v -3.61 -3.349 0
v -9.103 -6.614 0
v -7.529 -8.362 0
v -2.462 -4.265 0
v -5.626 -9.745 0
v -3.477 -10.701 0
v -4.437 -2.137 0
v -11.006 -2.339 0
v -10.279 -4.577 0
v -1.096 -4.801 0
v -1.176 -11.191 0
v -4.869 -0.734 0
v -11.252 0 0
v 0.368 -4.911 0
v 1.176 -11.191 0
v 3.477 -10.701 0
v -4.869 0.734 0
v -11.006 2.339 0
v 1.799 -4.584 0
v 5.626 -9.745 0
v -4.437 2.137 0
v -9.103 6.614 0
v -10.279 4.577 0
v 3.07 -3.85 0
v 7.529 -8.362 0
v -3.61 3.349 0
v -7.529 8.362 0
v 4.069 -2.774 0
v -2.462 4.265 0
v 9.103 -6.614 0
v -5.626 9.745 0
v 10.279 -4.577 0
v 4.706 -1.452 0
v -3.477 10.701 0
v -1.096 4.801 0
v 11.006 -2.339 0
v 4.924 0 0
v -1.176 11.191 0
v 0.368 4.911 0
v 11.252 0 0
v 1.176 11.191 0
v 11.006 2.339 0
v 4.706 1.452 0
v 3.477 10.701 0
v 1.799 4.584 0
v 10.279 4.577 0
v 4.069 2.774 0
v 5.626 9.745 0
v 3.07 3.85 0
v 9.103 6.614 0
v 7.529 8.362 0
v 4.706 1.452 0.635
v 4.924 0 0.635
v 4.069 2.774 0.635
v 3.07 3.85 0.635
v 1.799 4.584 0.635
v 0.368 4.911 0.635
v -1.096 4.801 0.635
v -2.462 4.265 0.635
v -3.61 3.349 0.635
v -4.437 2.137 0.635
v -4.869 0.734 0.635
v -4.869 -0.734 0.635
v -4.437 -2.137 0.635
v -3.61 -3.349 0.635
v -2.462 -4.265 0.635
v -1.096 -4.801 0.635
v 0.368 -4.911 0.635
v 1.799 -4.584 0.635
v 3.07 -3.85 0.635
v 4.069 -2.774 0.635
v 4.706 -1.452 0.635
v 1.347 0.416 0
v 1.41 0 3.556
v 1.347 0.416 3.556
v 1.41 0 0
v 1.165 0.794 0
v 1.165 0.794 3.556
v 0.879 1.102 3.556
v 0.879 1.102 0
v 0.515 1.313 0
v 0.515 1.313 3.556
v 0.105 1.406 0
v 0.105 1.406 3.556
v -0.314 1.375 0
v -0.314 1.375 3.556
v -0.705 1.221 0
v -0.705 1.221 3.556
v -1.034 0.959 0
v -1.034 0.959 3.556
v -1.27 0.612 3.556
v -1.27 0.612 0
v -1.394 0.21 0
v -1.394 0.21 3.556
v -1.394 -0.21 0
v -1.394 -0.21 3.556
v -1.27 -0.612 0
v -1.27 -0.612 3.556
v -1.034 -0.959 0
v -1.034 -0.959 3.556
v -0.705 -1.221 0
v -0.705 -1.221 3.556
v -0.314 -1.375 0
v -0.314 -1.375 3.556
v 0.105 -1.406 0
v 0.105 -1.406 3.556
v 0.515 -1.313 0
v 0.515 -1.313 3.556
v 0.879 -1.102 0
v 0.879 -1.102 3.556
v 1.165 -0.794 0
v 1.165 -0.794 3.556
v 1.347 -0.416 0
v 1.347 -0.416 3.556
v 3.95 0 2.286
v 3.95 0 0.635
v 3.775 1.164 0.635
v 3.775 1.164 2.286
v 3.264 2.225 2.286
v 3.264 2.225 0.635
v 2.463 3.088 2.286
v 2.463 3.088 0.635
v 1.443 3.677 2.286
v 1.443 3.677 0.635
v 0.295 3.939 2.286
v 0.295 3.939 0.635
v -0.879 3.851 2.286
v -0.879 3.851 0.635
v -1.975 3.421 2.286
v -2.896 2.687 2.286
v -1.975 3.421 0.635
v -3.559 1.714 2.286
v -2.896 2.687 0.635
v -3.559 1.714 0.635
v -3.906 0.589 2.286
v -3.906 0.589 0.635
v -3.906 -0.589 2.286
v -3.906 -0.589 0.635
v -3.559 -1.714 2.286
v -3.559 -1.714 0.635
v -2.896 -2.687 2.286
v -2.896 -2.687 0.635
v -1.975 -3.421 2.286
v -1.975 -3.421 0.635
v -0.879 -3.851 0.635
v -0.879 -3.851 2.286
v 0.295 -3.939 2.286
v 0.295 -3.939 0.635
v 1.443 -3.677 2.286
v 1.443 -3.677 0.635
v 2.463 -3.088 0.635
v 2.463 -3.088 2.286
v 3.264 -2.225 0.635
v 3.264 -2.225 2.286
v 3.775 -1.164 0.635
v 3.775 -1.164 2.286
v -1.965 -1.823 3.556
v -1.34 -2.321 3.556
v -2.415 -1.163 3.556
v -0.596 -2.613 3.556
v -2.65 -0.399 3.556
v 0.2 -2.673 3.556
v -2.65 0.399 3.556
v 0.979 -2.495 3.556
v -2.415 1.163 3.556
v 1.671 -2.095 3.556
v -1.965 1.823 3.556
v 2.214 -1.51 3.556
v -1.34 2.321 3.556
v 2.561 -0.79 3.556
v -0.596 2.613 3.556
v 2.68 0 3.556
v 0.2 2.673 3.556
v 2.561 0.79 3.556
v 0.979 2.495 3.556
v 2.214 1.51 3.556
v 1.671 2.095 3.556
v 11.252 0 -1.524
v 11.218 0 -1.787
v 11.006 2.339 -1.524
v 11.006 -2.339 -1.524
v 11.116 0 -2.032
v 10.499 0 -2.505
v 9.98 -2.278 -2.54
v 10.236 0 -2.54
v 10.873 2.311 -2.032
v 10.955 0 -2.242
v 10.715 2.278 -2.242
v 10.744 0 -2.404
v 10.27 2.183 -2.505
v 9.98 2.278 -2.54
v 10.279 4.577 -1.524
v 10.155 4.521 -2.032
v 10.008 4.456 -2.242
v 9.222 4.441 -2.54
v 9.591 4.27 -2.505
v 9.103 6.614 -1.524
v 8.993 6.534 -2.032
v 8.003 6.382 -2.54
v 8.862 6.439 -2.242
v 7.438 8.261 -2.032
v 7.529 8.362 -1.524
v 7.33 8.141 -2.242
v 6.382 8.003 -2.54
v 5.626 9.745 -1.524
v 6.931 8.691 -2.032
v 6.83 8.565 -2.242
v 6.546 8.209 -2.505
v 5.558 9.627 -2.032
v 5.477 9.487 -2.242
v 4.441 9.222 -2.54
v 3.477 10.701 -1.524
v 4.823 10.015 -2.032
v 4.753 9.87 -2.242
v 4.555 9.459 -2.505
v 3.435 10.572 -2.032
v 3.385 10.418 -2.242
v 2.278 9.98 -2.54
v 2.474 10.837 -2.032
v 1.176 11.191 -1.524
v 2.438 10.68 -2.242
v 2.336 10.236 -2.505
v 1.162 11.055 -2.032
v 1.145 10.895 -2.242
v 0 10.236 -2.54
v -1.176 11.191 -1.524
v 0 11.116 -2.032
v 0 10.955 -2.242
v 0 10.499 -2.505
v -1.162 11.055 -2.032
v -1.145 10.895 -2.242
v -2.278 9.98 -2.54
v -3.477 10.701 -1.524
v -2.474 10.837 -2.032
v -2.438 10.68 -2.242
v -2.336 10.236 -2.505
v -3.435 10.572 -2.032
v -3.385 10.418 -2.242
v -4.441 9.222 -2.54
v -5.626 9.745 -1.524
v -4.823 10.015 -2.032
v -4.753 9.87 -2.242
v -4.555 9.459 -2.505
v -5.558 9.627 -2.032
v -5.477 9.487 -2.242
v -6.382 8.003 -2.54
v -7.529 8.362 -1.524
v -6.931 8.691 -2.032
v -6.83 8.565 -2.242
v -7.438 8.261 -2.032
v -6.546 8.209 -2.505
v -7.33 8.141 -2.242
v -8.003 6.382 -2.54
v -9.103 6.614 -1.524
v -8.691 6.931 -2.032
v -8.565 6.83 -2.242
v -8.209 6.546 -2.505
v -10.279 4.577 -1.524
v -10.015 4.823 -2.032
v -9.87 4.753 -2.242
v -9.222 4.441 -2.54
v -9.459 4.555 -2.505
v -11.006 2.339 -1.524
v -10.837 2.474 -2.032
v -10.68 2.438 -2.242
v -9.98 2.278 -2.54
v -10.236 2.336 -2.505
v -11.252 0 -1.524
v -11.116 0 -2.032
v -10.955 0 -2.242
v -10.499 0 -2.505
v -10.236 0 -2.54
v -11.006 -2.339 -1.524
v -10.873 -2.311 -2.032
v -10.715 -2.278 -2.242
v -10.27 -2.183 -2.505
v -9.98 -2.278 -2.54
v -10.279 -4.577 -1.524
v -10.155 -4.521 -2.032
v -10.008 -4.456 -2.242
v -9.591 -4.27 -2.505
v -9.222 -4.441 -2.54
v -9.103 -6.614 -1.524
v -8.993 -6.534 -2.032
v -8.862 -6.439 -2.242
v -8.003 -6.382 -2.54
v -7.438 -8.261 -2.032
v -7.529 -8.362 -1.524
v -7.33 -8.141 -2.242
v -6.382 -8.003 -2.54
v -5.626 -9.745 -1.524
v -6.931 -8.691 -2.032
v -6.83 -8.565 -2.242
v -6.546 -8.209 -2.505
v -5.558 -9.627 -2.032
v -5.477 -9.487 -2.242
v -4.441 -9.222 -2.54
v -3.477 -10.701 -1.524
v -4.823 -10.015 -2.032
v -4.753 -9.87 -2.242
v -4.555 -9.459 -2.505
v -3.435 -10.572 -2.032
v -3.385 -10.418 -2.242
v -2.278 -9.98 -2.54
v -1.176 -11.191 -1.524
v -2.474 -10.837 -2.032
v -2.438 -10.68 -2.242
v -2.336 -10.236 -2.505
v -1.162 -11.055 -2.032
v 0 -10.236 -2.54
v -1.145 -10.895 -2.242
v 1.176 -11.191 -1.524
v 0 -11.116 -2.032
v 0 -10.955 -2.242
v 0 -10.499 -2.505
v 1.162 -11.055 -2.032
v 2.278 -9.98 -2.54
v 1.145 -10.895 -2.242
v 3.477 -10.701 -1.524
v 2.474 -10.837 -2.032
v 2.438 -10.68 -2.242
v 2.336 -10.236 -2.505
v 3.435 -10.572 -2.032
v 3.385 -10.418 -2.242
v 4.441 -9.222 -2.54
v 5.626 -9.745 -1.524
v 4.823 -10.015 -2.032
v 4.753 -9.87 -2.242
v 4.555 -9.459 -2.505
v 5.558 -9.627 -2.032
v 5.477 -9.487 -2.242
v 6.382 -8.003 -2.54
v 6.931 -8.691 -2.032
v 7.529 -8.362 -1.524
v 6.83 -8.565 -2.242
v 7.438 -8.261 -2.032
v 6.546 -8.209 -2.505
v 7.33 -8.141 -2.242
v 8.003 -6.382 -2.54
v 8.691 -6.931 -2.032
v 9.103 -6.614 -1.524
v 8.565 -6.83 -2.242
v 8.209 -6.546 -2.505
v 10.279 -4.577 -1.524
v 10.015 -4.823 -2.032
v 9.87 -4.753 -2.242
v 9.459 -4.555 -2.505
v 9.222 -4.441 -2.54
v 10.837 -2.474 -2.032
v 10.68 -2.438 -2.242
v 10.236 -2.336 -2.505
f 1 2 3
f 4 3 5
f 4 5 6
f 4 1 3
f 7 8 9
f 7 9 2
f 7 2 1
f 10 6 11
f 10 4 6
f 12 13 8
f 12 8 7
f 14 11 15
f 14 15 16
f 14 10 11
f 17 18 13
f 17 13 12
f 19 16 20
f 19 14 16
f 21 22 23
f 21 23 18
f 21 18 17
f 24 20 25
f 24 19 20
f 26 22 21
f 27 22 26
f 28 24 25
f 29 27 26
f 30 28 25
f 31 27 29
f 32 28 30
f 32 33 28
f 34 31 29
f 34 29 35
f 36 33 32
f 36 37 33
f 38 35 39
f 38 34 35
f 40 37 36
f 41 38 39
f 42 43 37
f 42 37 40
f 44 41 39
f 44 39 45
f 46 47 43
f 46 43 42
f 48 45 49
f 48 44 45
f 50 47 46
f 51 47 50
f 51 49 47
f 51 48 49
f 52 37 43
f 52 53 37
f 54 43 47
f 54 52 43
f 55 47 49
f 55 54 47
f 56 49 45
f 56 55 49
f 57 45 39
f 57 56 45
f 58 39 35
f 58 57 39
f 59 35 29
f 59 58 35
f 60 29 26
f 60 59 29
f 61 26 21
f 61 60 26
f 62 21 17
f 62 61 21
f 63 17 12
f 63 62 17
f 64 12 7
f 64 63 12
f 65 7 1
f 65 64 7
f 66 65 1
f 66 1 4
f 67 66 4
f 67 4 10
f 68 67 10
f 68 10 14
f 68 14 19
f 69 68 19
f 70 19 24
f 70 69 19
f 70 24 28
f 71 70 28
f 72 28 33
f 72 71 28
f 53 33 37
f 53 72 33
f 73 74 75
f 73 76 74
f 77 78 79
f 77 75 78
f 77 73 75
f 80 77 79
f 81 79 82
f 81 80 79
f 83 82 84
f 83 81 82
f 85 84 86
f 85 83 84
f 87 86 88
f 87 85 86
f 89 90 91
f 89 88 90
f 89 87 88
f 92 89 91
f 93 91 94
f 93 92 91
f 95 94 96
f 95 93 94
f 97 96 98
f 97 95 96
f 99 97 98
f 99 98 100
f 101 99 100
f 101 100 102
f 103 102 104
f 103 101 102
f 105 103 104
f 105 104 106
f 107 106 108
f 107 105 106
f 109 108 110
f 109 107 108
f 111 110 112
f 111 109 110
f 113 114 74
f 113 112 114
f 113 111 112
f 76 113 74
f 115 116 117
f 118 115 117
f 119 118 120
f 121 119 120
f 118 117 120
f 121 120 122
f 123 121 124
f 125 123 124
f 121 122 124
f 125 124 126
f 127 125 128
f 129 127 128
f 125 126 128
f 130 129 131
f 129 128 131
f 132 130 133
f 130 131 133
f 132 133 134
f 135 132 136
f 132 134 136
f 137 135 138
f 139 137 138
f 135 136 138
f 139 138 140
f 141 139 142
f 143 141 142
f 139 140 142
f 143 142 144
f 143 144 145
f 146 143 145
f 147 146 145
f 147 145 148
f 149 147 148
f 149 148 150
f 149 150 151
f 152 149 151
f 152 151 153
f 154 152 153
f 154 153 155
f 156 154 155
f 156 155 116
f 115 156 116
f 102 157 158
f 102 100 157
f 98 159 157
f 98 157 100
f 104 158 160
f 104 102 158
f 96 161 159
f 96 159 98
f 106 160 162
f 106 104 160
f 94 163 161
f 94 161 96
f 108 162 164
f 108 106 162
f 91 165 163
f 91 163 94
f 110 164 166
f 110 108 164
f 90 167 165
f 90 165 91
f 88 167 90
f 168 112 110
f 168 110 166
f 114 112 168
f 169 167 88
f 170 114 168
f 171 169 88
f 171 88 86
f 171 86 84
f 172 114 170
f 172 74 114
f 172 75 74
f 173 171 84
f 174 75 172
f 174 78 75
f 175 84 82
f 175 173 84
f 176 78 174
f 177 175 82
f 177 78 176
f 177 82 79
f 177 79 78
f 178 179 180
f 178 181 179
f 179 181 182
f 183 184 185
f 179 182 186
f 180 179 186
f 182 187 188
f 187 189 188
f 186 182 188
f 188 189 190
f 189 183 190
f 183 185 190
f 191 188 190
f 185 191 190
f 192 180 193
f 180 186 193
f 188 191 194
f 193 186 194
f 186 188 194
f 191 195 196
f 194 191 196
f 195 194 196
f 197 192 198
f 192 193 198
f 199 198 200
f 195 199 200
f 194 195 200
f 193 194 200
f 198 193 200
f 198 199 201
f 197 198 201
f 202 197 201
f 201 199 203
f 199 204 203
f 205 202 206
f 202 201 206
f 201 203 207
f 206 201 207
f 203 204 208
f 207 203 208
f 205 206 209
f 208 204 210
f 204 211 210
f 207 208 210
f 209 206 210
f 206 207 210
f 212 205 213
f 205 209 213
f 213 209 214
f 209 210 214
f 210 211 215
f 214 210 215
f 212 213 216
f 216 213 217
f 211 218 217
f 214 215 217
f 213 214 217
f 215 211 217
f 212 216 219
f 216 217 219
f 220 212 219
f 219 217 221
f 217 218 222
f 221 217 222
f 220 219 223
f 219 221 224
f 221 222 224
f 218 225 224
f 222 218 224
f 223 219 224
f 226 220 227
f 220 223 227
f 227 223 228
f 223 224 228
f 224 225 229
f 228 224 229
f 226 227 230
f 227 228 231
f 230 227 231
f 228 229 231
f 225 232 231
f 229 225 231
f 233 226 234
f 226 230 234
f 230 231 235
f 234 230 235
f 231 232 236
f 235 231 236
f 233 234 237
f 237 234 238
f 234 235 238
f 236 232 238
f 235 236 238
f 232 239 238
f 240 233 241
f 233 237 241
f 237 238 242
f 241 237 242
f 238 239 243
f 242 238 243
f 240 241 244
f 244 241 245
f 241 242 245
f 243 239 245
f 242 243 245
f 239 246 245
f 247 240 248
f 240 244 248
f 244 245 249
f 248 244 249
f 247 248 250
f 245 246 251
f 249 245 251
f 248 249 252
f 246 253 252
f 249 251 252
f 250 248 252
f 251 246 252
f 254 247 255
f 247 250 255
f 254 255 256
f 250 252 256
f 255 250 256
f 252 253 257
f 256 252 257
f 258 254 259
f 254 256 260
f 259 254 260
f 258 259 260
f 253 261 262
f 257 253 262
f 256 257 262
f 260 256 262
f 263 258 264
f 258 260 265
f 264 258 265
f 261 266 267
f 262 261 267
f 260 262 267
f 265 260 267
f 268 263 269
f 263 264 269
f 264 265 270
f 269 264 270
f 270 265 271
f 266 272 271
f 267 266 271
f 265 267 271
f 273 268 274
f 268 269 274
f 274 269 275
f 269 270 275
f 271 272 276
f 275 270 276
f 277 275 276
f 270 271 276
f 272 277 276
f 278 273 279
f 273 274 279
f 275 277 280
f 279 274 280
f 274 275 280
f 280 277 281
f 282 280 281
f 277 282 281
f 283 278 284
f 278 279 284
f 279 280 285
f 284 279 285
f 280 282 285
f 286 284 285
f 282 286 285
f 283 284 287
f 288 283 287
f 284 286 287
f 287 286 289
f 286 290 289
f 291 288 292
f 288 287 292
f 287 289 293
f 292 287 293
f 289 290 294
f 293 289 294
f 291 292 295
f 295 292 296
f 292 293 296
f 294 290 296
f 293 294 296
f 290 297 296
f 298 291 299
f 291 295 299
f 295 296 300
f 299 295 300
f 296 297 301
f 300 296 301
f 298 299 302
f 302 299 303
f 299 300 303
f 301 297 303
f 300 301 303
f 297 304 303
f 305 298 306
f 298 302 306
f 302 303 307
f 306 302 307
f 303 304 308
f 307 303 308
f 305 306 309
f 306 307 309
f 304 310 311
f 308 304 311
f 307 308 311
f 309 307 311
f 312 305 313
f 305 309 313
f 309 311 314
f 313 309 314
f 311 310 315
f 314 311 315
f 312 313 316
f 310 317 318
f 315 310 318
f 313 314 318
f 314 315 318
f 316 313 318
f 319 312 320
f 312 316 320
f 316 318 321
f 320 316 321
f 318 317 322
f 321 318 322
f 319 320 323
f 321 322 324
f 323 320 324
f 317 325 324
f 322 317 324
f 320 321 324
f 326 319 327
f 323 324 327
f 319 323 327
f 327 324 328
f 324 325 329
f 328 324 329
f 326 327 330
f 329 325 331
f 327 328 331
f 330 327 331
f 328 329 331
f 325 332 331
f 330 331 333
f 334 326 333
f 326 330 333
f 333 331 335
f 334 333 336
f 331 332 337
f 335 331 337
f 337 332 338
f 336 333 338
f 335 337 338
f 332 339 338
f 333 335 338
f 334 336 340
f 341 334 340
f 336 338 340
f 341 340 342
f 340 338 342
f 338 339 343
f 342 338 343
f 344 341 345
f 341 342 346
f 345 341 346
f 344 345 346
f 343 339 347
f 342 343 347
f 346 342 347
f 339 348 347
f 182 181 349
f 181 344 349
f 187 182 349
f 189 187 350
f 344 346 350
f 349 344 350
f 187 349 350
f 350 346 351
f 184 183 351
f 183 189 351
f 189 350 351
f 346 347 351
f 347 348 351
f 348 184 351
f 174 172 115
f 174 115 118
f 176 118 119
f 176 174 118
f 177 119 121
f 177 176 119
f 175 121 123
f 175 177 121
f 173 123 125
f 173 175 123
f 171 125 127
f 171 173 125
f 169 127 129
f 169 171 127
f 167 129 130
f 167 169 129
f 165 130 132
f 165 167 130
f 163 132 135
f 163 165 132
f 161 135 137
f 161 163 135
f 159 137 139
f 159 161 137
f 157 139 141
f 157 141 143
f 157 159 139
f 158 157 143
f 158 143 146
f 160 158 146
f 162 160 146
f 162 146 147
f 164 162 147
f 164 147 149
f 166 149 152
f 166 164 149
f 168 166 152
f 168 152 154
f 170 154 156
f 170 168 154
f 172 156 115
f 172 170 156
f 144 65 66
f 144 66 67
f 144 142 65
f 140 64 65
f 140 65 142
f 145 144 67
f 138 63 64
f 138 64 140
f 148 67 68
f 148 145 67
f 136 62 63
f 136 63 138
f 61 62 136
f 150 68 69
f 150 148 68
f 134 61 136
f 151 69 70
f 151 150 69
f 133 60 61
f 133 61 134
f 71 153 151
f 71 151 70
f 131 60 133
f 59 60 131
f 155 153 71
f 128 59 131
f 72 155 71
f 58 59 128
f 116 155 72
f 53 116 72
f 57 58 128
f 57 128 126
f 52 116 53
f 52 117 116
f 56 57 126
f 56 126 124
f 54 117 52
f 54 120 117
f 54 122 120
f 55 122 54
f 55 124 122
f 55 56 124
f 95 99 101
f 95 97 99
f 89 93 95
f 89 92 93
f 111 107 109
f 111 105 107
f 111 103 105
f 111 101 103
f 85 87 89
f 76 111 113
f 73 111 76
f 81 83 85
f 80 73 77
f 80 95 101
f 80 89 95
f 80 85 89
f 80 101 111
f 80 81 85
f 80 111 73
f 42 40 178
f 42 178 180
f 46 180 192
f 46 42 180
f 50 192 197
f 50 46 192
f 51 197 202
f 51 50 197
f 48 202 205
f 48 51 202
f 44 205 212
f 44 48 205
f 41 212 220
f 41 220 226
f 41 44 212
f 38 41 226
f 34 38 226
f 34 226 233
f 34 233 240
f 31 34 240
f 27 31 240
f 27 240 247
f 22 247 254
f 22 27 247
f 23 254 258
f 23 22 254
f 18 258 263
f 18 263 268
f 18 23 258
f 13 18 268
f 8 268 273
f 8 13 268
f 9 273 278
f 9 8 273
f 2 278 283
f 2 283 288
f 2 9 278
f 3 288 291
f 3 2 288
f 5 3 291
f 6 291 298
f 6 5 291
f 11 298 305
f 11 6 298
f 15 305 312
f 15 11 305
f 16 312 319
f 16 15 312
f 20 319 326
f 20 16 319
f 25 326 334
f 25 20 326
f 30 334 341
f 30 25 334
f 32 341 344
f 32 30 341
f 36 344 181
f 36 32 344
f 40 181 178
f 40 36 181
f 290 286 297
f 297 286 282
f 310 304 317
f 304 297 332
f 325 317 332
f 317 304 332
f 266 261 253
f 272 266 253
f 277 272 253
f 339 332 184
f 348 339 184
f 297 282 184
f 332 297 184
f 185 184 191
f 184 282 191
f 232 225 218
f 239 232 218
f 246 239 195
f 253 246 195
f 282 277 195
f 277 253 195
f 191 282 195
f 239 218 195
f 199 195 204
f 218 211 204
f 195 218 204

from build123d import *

# Parameters (mm, degrees)
F0_R     = 3.95
F1_DEPTH = 3.556
F0_R_2   = 11.2522
F2_DEPTH = 2.54
F3_R     = 1.016
F4_R     = 4.9244336153
F4_R_2   = 3.95
F5_DEPTH = 0.635
F6_T     = -2.54
F7_SIZE  = 1.27


with BuildPart() as f1:
    # F0 (on Top) → F1 (new body)
    with BuildSketch(Plane.XY):
        Circle(F0_R)
    extrude(amount=F1_DEPTH)

    # F0 (on Top) → F2 (join)
    with BuildSketch(Plane.XY):
        Circle(F0_R_2)
        Circle(F0_R, mode=Mode.SUBTRACT)
        Circle(F0_R)
    extrude(amount=-F2_DEPTH)

    # F3
    f3_edges = [f1.edges().sort_by_distance(p)[0] for p in [
        (-11.2522, 0, -2.54),
    ]]
    fillet(f3_edges, radius=F3_R)

    # F4 (on face) → F5 (join, symmetric)
    with BuildSketch(Plane.XY):
        Circle(F4_R)
        Circle(F4_R_2, mode=Mode.SUBTRACT)
    extrude(amount=F5_DEPTH, both=True)

    # F6
    f6_openings = [f1.faces().sort_by_distance(p)[0] for p in [
        (0, 0, 3.556),
    ]]
    offset(amount=F6_T, openings=f6_openings, kind=Kind.INTERSECTION)

    # F7
    f7_edges = [f1.edges().sort_by_distance(p)[0] for p in [
        (-3.95, 0, 3.556),
    ]]
    chamfer(f7_edges, length=F7_SIZE)


solid = f1.part
